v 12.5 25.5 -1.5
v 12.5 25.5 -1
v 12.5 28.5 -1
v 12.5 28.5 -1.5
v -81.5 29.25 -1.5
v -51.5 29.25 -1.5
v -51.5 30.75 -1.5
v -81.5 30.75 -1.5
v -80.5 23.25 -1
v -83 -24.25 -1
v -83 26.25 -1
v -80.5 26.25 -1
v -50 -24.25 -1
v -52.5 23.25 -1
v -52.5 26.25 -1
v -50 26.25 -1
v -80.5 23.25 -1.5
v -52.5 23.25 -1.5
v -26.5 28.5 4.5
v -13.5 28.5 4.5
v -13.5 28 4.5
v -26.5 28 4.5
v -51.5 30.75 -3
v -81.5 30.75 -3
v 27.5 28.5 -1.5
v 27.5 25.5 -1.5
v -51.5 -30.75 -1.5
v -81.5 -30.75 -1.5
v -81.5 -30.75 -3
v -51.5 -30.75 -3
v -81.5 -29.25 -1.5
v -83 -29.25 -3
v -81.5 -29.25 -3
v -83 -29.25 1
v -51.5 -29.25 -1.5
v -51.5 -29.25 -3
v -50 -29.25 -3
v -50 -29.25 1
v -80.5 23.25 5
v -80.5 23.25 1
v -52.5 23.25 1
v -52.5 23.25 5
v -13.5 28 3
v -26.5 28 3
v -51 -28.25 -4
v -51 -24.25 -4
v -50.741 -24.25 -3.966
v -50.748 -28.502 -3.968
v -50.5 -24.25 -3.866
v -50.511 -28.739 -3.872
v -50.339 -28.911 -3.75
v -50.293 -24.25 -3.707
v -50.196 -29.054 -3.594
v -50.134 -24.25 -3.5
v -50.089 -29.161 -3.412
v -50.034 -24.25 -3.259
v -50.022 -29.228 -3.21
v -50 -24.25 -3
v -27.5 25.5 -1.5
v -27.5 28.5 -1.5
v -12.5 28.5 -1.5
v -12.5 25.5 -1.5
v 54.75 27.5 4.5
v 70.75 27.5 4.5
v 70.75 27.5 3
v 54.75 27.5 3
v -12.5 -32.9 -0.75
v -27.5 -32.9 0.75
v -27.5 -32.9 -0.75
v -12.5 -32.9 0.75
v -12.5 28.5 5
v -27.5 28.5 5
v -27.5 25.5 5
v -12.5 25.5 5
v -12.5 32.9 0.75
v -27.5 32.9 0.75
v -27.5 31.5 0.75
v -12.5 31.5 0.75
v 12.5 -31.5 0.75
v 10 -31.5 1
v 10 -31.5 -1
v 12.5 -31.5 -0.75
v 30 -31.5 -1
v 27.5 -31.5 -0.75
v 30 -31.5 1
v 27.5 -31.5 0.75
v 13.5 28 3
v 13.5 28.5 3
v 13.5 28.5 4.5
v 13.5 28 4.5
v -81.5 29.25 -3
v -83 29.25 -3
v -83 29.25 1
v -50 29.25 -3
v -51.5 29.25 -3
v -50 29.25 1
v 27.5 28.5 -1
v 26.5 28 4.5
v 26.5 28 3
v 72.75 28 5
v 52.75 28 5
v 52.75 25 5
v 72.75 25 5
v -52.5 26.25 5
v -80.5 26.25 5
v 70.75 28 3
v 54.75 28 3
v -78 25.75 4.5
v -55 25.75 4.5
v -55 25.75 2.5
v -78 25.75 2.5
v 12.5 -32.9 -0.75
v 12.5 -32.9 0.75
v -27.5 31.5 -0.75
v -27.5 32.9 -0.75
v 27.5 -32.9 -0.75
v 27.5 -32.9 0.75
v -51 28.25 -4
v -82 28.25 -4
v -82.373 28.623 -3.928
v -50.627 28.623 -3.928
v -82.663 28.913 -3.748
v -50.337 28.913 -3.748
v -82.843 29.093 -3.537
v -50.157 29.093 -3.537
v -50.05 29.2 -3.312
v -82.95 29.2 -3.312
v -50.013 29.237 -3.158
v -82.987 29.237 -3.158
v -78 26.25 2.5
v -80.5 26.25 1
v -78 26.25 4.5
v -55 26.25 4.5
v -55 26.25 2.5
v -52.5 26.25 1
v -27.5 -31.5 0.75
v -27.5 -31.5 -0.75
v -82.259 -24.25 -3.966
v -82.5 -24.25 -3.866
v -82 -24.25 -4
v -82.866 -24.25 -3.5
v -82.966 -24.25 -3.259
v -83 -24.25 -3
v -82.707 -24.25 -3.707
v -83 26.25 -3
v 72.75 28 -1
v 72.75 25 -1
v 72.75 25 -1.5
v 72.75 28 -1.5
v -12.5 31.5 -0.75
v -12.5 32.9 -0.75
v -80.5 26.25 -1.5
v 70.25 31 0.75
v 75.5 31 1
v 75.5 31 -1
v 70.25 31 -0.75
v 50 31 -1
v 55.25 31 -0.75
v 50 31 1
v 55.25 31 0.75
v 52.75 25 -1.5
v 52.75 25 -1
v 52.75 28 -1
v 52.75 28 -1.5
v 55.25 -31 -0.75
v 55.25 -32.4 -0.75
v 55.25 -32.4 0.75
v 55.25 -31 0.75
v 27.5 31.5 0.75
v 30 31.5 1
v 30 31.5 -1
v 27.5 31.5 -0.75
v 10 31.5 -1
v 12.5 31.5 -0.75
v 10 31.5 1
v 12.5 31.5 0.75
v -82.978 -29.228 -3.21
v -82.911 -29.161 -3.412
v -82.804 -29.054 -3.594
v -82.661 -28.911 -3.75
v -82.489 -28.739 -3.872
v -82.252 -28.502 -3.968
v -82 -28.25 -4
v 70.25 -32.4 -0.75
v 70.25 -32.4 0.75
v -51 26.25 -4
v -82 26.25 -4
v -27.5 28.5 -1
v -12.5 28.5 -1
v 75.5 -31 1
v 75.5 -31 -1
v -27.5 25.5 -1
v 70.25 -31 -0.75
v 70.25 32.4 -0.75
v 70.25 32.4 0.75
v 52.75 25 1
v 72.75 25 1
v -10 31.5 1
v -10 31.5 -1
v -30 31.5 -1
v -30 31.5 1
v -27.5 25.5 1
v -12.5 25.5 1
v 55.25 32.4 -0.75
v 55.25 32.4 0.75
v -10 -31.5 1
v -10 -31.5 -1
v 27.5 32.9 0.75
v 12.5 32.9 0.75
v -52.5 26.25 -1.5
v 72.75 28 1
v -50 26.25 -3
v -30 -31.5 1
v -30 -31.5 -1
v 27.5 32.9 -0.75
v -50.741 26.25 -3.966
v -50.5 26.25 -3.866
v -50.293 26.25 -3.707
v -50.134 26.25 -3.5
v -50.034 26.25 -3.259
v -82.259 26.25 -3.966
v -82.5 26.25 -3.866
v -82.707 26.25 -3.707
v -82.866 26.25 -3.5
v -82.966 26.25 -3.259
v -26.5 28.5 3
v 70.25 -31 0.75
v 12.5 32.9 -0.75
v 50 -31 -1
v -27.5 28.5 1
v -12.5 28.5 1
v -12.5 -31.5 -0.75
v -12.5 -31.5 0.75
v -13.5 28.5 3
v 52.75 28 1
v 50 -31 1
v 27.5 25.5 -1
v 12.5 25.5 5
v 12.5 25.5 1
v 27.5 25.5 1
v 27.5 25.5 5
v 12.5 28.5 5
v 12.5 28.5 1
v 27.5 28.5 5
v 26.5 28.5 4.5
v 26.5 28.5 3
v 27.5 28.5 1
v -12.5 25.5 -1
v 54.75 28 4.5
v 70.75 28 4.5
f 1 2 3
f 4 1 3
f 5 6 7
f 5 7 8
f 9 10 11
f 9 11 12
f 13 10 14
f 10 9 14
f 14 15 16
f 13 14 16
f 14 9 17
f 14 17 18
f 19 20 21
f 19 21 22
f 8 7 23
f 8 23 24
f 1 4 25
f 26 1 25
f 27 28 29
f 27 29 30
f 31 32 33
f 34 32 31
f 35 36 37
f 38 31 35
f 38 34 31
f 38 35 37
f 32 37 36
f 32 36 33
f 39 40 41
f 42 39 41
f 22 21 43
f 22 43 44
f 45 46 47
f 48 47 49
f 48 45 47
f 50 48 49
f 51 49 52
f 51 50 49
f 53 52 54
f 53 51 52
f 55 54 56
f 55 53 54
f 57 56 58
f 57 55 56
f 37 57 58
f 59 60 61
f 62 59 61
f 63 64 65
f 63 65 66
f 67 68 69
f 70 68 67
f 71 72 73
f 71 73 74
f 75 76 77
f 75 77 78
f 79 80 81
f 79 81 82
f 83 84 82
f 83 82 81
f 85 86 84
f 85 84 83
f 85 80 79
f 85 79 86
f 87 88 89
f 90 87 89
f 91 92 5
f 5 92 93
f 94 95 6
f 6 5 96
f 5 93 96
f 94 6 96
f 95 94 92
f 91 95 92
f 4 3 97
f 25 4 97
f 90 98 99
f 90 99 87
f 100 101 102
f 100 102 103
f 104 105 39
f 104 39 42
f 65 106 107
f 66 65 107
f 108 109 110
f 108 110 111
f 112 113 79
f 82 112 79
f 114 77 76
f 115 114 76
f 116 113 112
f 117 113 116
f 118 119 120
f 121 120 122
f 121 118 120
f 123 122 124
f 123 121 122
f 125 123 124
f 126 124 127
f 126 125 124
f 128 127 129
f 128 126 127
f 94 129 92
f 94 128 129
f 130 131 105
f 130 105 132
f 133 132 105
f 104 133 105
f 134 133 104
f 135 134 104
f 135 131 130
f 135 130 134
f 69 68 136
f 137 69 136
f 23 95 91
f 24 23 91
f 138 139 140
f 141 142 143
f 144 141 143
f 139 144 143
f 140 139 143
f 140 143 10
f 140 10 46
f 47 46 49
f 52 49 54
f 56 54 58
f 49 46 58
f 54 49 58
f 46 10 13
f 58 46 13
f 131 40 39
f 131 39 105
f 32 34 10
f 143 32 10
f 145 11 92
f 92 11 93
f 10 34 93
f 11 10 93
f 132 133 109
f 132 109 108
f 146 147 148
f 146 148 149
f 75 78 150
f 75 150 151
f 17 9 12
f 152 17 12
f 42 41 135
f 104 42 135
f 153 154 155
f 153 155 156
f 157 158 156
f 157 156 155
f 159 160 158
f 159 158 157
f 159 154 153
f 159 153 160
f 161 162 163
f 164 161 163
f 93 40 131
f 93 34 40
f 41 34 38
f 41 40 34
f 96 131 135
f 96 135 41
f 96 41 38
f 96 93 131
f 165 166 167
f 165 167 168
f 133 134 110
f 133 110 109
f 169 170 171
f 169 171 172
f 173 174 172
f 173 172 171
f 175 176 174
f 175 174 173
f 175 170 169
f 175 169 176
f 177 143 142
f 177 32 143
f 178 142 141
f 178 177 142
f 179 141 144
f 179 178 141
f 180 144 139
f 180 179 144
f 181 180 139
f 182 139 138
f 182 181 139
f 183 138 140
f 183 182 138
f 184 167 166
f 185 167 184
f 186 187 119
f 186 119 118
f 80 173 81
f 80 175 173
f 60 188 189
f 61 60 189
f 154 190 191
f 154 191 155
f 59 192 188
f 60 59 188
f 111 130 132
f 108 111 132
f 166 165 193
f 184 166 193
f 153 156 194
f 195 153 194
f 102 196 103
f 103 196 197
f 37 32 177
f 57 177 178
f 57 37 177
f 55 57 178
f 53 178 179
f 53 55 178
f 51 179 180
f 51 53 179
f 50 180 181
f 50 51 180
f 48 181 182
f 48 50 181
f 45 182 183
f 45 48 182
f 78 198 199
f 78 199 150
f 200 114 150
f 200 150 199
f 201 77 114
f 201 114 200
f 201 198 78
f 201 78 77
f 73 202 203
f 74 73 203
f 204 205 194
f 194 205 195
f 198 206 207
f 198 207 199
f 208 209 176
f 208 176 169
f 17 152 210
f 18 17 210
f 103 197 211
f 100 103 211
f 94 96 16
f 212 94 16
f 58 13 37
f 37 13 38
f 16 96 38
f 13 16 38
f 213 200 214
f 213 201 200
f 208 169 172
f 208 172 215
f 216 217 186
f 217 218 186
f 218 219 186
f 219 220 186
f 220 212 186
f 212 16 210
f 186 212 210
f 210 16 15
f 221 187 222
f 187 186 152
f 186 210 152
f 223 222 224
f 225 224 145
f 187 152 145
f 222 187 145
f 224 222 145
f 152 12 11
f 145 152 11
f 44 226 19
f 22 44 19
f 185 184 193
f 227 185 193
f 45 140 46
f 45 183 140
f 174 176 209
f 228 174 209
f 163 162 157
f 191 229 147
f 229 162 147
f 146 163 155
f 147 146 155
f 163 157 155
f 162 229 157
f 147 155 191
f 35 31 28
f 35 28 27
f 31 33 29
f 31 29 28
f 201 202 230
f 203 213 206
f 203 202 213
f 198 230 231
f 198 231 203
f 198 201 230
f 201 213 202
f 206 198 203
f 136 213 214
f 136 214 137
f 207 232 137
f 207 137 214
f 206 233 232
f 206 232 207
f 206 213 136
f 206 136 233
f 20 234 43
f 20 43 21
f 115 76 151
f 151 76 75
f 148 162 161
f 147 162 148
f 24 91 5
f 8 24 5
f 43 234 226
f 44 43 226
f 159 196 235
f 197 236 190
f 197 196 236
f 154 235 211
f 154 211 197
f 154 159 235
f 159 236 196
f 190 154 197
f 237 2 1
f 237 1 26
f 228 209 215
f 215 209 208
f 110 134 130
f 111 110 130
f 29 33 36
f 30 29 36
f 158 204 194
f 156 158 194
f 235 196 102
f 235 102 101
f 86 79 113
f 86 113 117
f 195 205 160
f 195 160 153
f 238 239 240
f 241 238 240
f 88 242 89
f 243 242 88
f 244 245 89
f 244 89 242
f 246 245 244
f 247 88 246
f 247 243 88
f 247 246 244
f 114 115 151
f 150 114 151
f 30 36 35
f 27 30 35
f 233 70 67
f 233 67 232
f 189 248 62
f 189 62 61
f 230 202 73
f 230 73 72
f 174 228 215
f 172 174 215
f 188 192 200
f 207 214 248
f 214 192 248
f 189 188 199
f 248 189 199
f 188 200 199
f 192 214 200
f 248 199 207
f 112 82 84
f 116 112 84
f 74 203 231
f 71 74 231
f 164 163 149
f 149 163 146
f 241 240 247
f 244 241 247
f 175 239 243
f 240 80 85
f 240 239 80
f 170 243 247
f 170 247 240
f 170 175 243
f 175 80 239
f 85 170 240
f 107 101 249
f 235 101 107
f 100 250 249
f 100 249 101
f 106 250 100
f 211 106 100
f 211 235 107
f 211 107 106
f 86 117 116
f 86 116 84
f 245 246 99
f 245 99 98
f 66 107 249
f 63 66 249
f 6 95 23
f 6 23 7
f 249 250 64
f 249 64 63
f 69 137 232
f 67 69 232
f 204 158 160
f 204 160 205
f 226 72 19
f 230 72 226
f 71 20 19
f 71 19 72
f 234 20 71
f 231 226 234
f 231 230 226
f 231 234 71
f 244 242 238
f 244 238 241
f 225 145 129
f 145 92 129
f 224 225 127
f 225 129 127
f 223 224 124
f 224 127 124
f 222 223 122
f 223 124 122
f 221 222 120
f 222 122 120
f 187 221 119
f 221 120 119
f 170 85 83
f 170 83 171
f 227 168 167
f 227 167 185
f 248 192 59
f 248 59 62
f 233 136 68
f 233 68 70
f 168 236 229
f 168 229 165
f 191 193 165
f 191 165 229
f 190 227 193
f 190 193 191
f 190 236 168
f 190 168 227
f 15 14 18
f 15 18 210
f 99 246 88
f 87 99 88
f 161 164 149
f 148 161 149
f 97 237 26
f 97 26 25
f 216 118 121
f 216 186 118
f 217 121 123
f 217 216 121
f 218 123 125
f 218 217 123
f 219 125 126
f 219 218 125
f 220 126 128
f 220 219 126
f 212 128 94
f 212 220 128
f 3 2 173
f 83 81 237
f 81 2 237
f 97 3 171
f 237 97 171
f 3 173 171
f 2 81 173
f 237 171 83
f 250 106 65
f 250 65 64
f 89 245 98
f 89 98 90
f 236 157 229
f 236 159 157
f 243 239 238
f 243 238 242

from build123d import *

# Parameters (mm, degrees)
F0_W          = 15
F0_H          = 1.4
F1_DEPTH      = 0.75
F0_W_2        = 28
F0_H_2        = 3
F2_DEPTH      = 1
F0_W_3        = 20
F3_DEPTH      = 5
F3_DEPTH_BACK = 1.5
F4_W          = 23
F4_H          = 2
F5_DEPTH      = 0.5
F6_W          = 13
F6_H          = 1.5
F7_DEPTH      = 0.5
F8_W          = 16
F8_H          = 1.5
F9_DEPTH      = 0.5
F10_W         = 33
F10_H         = 5
F11_DEPTH     = 3
F12_W         = 30
F12_H         = 1.5
F13_DEPTH     = 1.5
F14_W         = 30
F14_H         = 1.5
F15_DEPTH     = 1.5
F16_R         = 0.99999


# Not quite as in the source:
# - a fillet or chamfer is up to 0.001 mm smaller than in the source, because OpenCascade refuses the exact size
# - a feature names something its author has since deleted; it is built from what else it names


with BuildPart() as f1:
    # F0 (on Top) → F1 (new body, symmetric)
    with BuildSketch(Plane.XY):
        with Locations((-20, 32.2)):
            Rectangle(F0_W, F0_H)
    extrude(amount=F1_DEPTH, both=True)



with BuildPart() as f1b:
    # F0 (on Top) → F1, piece 2 (new body, symmetric)
    with BuildSketch(Plane.XY):
        with Locations((20, 32.2)):
            Rectangle(F0_W, F0_H)
    extrude(amount=F1_DEPTH, both=True)



with BuildPart() as f1c:
    # F0 (on Top) → F1, piece 3 (new body, symmetric)
    with BuildSketch(Plane.XY):
        with Locations((62.75, 31.7)):
            Rectangle(F0_W, F0_H)
    extrude(amount=F1_DEPTH, both=True)



with BuildPart() as f1d:
    # F0 (on Top) → F1, piece 4 (new body, symmetric)
    with BuildSketch(Plane.XY):
        with Locations((62.75, -31.7)):
            Rectangle(F0_W, F0_H)
    extrude(amount=F1_DEPTH, both=True)


with BuildPart() as f1e:
    # F0 (on Top) → F1, piece 5 (new body, symmetric)
    with BuildSketch(Plane.XY):
        with Locations((20, -32.2)):
            Rectangle(F0_W, F0_H)
    extrude(amount=F1_DEPTH, both=True)


with BuildPart() as f1f:
    # F0 (on Top) → F1, piece 6 (new body, symmetric)
    with BuildSketch(Plane.XY):
        with Locations((-20, -32.2)):
            Rectangle(F0_W, F0_H)
    extrude(amount=F1_DEPTH, both=True)


with BuildPart() as f2:
    # F0 (on Top) → F2 (new body, symmetric)
    with BuildSketch(Plane.XY):
        Polygon((-50, 29.25), (-83, 29.25), (-83, -29.25), (-76, -29.25), (-57, -29.25), (-50, -29.25), align=None)
        with Locations((-66.5, 24.75)):
            Rectangle(F0_W_2, F0_H_2, mode=Mode.SUBTRACT)
    extrude(amount=F2_DEPTH, both=True)

    # F0 (on Top) → F3 (join, two sides)
    with BuildSketch(Plane.XY) as f3_sk:
        with Locations((-66.5, 24.75)):
            Rectangle(F0_W_2, F0_H_2)
    extrude(amount=F3_DEPTH)
    extrude(f3_sk.sketch, amount=-F3_DEPTH_BACK)

    # F4 (on face) → F5 (cut)
    with BuildSketch(Plane(origin=(0, 26.25, 0), x_dir=(-1, 0, 0), z_dir=(0, 1, 0))):
        with Locations((66.5, 3.5)):
            Rectangle(F4_W, F4_H)
    extrude(amount=-F5_DEPTH, mode=Mode.SUBTRACT)

    # F10 (on face) → F11 (join)
    with BuildSketch(Plane(origin=(0, 0, -1), x_dir=(1, 0, 0), z_dir=(0, 0, -1))):
        Polygon((-83, -26.25), (-83, -29.25), (-50, -29.25), (-50, -26.25), (-52.5, -26.25), (-80.5, -26.25), align=None)
        with Locations((-66.5, 26.75)):
            Rectangle(F10_W, F10_H)
    extrude(amount=F11_DEPTH)

    # F12 (on face) → F13 (join)
    with BuildSketch(Plane(origin=(0, 29.25, 0), x_dir=(-1, 0, 0), z_dir=(0, 1, 0))):
        with Locations((66.5, -2.25)):
            Rectangle(F12_W, F12_H)
    extrude(amount=F13_DEPTH)

    # F14 (on face) → F15 (join)
    with BuildSketch(Plane.XZ.offset(29.25)):
        with Locations((-66.5, -2.25)):
            Rectangle(F14_W, F14_H)
    extrude(amount=F15_DEPTH)

    # F16 (radius 1 in the source; OpenCascade refuses exactly that, so slightly less here)
    f16_edges = [f2.edges().sort_by_distance(p)[0] for p in [
        (-66.5, 29.25, -4),
        (-66.5, -29.25, -4),
        (-83, 27.75, -4),
        (-83, -26.75, -4),
        (-50, 27.75, -4),
        (-50, -26.75, -4),
    ]]
    fillet(f16_edges, radius=F16_R)


with BuildPart() as f1_1:
    add(f1.part)

    add(f1f.part)  # F2#2 merges F1f
    # F0 (on Top) → F2, piece 2 (join, symmetric)
    with BuildSketch(Plane.XY):
        Polygon((-27.5, 31.5), (-30, 31.5), (-30, -31.5), (-27.5, -31.5), (-12.5, -31.5), (-10, -31.5), (-10, 31.5), (-12.5, 31.5), align=None)
        with Locations((-20, 27)):
            Rectangle(F0_W, F0_H_2, mode=Mode.SUBTRACT)
    extrude(amount=F2_DEPTH, both=True)

    # F0 (on Top) → F3, piece 2 (join, two sides)
    with BuildSketch(Plane.XY) as f3_2_sk:
        with Locations((-20, 27)):
            Rectangle(F0_W, F0_H_2)
    extrude(amount=F3_DEPTH)
    extrude(f3_2_sk.sketch, amount=-F3_DEPTH_BACK)


with BuildPart() as f1b_1:
    add(f1b.part)

    add(f1e.part)  # F2#3 merges F1e
    # F0 (on Top) → F2, piece 3 (join, symmetric)
    with BuildSketch(Plane.XY):
        Polygon((12.5, 31.5), (10, 31.5), (10, -31.5), (12.5, -31.5), (27.5, -31.5), (30, -31.5), (30, 31.5), (27.5, 31.5), align=None)
        with Locations((20, 27)):
            Rectangle(F0_W, F0_H_2, mode=Mode.SUBTRACT)
    extrude(amount=F2_DEPTH, both=True)

    # F0 (on Top) → F3, piece 3 (join, two sides)
    with BuildSketch(Plane.XY) as f3_3_sk:
        with Locations((20, 27)):
            Rectangle(F0_W, F0_H_2)
    extrude(amount=F3_DEPTH)
    extrude(f3_3_sk.sketch, amount=-F3_DEPTH_BACK)


with BuildPart() as f1c_1:
    add(f1c.part)

    add(f1d.part)  # F2#4 merges F1d
    # F0 (on Top) → F2, piece 4 (join, symmetric)
    with BuildSketch(Plane.XY):
        Polygon((55.25, 31), (50, 31), (50, -31), (55.25, -31), (70.25, -31), (75.5, -31), (75.5, 31), (70.25, 31), align=None)
        with Locations((62.75, 26.5)):
            Rectangle(F0_W_3, F0_H_2, mode=Mode.SUBTRACT)
    extrude(amount=F2_DEPTH, both=True)

    # F0 (on Top) → F3, piece 4 (join, two sides)
    with BuildSketch(Plane.XY) as f3_4_sk:
        with Locations((62.75, 26.5)):
            Rectangle(F0_W_3, F0_H_2)
    extrude(amount=F3_DEPTH)
    extrude(f3_4_sk.sketch, amount=-F3_DEPTH_BACK)

    # F8 (on face) → F9 (cut)
    with BuildSketch(Plane(origin=(0, 28, 0), x_dir=(-1, 0, 0), z_dir=(0, 1, 0))):
        with Locations((-62.75, 3.75)):
            Rectangle(F8_W, F8_H)
    extrude(amount=-F9_DEPTH, mode=Mode.SUBTRACT)


with BuildPart() as f7_tool:
    # F6 (on face) → F7 (new body)
    with BuildSketch(Plane(origin=(0, 28.5, 0), x_dir=(-1, 0, 0), z_dir=(0, 1, 0))):
        with Locations((-20, 3.75)):
            Rectangle(F6_W, F6_H)
        with Locations((20, 3.75)):
            Rectangle(F6_W, F6_H)
    extrude(amount=-F7_DEPTH)


with BuildPart() as f1_2:
    add(f1_1.part)

    # F7: cut by f7_tool
    add(f7_tool.part, mode=Mode.SUBTRACT)


with BuildPart() as f1b_2:
    add(f1b_1.part)

    # F7: cut by f7_tool
    add(f7_tool.part, mode=Mode.SUBTRACT)


solid = Compound([f2.part, f1c_1.part, f1_2.part, f1b_2.part])
